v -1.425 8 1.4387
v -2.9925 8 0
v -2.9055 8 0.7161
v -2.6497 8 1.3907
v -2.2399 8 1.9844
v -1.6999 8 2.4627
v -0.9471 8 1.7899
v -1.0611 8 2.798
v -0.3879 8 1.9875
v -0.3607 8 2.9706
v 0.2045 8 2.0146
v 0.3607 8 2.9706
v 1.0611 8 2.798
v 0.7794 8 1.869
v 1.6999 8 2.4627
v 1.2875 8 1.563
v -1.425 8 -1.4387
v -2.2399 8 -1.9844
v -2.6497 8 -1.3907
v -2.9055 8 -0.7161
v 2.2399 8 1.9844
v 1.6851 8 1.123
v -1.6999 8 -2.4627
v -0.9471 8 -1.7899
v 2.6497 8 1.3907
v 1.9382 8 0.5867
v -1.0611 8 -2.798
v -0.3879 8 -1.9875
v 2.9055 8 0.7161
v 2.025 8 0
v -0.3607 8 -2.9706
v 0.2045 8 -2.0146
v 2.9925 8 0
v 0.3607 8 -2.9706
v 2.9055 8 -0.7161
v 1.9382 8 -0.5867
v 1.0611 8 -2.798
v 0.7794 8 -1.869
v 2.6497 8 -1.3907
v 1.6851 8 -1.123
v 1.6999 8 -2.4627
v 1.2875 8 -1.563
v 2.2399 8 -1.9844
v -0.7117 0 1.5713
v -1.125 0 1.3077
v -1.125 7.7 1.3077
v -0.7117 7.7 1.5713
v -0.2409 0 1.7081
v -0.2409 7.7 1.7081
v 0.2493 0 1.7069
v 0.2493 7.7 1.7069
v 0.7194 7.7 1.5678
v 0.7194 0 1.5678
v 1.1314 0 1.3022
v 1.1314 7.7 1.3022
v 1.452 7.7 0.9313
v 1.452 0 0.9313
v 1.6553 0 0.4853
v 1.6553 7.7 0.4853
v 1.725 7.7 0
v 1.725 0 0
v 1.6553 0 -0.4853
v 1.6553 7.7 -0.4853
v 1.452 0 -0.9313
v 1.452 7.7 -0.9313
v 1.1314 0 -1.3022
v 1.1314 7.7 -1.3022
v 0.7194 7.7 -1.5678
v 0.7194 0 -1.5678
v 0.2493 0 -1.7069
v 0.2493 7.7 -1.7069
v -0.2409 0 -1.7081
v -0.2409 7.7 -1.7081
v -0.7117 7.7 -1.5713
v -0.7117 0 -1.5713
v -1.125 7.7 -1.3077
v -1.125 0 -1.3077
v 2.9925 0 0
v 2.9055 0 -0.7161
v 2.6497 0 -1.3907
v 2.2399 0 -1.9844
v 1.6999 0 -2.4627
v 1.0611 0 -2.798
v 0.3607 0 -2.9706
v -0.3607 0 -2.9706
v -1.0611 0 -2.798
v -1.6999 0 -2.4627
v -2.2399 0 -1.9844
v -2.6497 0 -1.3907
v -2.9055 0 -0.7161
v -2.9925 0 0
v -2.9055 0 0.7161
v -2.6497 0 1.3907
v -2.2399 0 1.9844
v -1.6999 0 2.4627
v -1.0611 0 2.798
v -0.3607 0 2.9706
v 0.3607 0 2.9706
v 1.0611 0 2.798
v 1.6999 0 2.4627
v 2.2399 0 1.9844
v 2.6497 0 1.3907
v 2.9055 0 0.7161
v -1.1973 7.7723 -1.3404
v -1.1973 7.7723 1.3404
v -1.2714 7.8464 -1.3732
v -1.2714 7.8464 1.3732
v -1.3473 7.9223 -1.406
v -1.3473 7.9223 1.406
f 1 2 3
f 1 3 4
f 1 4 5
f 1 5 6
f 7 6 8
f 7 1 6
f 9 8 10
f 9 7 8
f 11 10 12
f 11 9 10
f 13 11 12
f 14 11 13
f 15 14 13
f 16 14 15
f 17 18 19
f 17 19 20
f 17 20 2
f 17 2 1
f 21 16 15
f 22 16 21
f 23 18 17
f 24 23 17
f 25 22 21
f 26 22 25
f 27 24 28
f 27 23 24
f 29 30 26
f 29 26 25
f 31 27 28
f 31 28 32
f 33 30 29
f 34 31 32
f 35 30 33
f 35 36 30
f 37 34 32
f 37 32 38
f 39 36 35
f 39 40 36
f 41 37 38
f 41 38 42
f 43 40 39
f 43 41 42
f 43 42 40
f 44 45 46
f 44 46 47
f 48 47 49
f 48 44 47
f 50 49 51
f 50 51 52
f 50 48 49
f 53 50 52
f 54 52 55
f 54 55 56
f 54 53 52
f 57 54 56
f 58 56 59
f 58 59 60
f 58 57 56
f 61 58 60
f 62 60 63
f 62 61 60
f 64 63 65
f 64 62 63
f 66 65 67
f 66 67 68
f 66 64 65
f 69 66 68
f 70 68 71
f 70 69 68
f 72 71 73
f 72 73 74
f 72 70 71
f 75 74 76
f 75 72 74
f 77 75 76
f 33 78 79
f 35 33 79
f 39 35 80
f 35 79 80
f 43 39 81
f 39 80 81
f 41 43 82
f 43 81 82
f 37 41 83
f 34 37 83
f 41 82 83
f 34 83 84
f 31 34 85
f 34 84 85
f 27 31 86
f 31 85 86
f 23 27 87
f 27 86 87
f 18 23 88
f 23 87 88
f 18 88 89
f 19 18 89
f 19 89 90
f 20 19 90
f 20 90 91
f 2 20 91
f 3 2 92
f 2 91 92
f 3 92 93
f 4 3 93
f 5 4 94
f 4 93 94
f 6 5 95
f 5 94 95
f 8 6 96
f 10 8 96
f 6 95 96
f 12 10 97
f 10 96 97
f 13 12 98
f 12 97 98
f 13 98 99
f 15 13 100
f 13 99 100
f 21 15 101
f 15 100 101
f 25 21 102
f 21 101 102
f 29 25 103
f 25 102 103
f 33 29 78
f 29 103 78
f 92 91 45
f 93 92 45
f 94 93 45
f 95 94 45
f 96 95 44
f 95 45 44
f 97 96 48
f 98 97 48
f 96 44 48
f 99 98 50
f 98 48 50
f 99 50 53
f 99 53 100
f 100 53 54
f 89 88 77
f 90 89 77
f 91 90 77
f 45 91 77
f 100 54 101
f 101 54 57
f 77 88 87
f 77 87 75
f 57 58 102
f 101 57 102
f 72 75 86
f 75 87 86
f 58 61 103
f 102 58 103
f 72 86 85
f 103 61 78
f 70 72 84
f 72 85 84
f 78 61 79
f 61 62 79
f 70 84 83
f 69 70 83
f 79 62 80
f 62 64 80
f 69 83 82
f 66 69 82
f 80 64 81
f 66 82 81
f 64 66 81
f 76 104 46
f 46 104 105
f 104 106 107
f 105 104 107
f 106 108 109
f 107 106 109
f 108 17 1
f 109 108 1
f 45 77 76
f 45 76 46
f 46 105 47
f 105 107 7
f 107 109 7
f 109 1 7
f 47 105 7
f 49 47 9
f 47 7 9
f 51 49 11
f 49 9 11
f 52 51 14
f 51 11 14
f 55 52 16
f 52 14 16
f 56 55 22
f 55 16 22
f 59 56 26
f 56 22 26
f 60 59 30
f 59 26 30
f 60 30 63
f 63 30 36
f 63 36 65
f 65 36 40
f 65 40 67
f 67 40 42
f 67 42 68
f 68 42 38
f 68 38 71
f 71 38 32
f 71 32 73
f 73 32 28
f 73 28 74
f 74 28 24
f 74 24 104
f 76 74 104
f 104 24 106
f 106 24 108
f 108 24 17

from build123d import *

# Parameters (mm, degrees)
SKETCH1_R           = 2.992461664
BOSS_EXTRUDE1_DEPTH = 8
CHAMFER2_SIZE       = 0.3


with BuildPart() as part:
    # Sketch1 → Boss-Extrude1 (new body)
    with BuildSketch(Plane(origin=(0, 0, 0), x_dir=(1, 0, 0), z_dir=(0, 1, 0))):
        Circle(SKETCH1_R)
        with BuildLine():
            Line((-1.125, 1.307669683), (-1.125, -1.307669683))
            ThreePointArc((-1.125, -1.307669683), (1.725, 0), (-1.125, 1.307669683))
        make_face(mode=Mode.SUBTRACT)
    extrude(amount=BOSS_EXTRUDE1_DEPTH)

    # Chamfer2
    chamfer2_edges = [part.edges().sort_by_distance(p)[0] for p in [
        (1.725, 8, 0),
        (-1.125, 8, 0),
    ]]
    chamfer(chamfer2_edges, length=CHAMFER2_SIZE)


solid = part.part
